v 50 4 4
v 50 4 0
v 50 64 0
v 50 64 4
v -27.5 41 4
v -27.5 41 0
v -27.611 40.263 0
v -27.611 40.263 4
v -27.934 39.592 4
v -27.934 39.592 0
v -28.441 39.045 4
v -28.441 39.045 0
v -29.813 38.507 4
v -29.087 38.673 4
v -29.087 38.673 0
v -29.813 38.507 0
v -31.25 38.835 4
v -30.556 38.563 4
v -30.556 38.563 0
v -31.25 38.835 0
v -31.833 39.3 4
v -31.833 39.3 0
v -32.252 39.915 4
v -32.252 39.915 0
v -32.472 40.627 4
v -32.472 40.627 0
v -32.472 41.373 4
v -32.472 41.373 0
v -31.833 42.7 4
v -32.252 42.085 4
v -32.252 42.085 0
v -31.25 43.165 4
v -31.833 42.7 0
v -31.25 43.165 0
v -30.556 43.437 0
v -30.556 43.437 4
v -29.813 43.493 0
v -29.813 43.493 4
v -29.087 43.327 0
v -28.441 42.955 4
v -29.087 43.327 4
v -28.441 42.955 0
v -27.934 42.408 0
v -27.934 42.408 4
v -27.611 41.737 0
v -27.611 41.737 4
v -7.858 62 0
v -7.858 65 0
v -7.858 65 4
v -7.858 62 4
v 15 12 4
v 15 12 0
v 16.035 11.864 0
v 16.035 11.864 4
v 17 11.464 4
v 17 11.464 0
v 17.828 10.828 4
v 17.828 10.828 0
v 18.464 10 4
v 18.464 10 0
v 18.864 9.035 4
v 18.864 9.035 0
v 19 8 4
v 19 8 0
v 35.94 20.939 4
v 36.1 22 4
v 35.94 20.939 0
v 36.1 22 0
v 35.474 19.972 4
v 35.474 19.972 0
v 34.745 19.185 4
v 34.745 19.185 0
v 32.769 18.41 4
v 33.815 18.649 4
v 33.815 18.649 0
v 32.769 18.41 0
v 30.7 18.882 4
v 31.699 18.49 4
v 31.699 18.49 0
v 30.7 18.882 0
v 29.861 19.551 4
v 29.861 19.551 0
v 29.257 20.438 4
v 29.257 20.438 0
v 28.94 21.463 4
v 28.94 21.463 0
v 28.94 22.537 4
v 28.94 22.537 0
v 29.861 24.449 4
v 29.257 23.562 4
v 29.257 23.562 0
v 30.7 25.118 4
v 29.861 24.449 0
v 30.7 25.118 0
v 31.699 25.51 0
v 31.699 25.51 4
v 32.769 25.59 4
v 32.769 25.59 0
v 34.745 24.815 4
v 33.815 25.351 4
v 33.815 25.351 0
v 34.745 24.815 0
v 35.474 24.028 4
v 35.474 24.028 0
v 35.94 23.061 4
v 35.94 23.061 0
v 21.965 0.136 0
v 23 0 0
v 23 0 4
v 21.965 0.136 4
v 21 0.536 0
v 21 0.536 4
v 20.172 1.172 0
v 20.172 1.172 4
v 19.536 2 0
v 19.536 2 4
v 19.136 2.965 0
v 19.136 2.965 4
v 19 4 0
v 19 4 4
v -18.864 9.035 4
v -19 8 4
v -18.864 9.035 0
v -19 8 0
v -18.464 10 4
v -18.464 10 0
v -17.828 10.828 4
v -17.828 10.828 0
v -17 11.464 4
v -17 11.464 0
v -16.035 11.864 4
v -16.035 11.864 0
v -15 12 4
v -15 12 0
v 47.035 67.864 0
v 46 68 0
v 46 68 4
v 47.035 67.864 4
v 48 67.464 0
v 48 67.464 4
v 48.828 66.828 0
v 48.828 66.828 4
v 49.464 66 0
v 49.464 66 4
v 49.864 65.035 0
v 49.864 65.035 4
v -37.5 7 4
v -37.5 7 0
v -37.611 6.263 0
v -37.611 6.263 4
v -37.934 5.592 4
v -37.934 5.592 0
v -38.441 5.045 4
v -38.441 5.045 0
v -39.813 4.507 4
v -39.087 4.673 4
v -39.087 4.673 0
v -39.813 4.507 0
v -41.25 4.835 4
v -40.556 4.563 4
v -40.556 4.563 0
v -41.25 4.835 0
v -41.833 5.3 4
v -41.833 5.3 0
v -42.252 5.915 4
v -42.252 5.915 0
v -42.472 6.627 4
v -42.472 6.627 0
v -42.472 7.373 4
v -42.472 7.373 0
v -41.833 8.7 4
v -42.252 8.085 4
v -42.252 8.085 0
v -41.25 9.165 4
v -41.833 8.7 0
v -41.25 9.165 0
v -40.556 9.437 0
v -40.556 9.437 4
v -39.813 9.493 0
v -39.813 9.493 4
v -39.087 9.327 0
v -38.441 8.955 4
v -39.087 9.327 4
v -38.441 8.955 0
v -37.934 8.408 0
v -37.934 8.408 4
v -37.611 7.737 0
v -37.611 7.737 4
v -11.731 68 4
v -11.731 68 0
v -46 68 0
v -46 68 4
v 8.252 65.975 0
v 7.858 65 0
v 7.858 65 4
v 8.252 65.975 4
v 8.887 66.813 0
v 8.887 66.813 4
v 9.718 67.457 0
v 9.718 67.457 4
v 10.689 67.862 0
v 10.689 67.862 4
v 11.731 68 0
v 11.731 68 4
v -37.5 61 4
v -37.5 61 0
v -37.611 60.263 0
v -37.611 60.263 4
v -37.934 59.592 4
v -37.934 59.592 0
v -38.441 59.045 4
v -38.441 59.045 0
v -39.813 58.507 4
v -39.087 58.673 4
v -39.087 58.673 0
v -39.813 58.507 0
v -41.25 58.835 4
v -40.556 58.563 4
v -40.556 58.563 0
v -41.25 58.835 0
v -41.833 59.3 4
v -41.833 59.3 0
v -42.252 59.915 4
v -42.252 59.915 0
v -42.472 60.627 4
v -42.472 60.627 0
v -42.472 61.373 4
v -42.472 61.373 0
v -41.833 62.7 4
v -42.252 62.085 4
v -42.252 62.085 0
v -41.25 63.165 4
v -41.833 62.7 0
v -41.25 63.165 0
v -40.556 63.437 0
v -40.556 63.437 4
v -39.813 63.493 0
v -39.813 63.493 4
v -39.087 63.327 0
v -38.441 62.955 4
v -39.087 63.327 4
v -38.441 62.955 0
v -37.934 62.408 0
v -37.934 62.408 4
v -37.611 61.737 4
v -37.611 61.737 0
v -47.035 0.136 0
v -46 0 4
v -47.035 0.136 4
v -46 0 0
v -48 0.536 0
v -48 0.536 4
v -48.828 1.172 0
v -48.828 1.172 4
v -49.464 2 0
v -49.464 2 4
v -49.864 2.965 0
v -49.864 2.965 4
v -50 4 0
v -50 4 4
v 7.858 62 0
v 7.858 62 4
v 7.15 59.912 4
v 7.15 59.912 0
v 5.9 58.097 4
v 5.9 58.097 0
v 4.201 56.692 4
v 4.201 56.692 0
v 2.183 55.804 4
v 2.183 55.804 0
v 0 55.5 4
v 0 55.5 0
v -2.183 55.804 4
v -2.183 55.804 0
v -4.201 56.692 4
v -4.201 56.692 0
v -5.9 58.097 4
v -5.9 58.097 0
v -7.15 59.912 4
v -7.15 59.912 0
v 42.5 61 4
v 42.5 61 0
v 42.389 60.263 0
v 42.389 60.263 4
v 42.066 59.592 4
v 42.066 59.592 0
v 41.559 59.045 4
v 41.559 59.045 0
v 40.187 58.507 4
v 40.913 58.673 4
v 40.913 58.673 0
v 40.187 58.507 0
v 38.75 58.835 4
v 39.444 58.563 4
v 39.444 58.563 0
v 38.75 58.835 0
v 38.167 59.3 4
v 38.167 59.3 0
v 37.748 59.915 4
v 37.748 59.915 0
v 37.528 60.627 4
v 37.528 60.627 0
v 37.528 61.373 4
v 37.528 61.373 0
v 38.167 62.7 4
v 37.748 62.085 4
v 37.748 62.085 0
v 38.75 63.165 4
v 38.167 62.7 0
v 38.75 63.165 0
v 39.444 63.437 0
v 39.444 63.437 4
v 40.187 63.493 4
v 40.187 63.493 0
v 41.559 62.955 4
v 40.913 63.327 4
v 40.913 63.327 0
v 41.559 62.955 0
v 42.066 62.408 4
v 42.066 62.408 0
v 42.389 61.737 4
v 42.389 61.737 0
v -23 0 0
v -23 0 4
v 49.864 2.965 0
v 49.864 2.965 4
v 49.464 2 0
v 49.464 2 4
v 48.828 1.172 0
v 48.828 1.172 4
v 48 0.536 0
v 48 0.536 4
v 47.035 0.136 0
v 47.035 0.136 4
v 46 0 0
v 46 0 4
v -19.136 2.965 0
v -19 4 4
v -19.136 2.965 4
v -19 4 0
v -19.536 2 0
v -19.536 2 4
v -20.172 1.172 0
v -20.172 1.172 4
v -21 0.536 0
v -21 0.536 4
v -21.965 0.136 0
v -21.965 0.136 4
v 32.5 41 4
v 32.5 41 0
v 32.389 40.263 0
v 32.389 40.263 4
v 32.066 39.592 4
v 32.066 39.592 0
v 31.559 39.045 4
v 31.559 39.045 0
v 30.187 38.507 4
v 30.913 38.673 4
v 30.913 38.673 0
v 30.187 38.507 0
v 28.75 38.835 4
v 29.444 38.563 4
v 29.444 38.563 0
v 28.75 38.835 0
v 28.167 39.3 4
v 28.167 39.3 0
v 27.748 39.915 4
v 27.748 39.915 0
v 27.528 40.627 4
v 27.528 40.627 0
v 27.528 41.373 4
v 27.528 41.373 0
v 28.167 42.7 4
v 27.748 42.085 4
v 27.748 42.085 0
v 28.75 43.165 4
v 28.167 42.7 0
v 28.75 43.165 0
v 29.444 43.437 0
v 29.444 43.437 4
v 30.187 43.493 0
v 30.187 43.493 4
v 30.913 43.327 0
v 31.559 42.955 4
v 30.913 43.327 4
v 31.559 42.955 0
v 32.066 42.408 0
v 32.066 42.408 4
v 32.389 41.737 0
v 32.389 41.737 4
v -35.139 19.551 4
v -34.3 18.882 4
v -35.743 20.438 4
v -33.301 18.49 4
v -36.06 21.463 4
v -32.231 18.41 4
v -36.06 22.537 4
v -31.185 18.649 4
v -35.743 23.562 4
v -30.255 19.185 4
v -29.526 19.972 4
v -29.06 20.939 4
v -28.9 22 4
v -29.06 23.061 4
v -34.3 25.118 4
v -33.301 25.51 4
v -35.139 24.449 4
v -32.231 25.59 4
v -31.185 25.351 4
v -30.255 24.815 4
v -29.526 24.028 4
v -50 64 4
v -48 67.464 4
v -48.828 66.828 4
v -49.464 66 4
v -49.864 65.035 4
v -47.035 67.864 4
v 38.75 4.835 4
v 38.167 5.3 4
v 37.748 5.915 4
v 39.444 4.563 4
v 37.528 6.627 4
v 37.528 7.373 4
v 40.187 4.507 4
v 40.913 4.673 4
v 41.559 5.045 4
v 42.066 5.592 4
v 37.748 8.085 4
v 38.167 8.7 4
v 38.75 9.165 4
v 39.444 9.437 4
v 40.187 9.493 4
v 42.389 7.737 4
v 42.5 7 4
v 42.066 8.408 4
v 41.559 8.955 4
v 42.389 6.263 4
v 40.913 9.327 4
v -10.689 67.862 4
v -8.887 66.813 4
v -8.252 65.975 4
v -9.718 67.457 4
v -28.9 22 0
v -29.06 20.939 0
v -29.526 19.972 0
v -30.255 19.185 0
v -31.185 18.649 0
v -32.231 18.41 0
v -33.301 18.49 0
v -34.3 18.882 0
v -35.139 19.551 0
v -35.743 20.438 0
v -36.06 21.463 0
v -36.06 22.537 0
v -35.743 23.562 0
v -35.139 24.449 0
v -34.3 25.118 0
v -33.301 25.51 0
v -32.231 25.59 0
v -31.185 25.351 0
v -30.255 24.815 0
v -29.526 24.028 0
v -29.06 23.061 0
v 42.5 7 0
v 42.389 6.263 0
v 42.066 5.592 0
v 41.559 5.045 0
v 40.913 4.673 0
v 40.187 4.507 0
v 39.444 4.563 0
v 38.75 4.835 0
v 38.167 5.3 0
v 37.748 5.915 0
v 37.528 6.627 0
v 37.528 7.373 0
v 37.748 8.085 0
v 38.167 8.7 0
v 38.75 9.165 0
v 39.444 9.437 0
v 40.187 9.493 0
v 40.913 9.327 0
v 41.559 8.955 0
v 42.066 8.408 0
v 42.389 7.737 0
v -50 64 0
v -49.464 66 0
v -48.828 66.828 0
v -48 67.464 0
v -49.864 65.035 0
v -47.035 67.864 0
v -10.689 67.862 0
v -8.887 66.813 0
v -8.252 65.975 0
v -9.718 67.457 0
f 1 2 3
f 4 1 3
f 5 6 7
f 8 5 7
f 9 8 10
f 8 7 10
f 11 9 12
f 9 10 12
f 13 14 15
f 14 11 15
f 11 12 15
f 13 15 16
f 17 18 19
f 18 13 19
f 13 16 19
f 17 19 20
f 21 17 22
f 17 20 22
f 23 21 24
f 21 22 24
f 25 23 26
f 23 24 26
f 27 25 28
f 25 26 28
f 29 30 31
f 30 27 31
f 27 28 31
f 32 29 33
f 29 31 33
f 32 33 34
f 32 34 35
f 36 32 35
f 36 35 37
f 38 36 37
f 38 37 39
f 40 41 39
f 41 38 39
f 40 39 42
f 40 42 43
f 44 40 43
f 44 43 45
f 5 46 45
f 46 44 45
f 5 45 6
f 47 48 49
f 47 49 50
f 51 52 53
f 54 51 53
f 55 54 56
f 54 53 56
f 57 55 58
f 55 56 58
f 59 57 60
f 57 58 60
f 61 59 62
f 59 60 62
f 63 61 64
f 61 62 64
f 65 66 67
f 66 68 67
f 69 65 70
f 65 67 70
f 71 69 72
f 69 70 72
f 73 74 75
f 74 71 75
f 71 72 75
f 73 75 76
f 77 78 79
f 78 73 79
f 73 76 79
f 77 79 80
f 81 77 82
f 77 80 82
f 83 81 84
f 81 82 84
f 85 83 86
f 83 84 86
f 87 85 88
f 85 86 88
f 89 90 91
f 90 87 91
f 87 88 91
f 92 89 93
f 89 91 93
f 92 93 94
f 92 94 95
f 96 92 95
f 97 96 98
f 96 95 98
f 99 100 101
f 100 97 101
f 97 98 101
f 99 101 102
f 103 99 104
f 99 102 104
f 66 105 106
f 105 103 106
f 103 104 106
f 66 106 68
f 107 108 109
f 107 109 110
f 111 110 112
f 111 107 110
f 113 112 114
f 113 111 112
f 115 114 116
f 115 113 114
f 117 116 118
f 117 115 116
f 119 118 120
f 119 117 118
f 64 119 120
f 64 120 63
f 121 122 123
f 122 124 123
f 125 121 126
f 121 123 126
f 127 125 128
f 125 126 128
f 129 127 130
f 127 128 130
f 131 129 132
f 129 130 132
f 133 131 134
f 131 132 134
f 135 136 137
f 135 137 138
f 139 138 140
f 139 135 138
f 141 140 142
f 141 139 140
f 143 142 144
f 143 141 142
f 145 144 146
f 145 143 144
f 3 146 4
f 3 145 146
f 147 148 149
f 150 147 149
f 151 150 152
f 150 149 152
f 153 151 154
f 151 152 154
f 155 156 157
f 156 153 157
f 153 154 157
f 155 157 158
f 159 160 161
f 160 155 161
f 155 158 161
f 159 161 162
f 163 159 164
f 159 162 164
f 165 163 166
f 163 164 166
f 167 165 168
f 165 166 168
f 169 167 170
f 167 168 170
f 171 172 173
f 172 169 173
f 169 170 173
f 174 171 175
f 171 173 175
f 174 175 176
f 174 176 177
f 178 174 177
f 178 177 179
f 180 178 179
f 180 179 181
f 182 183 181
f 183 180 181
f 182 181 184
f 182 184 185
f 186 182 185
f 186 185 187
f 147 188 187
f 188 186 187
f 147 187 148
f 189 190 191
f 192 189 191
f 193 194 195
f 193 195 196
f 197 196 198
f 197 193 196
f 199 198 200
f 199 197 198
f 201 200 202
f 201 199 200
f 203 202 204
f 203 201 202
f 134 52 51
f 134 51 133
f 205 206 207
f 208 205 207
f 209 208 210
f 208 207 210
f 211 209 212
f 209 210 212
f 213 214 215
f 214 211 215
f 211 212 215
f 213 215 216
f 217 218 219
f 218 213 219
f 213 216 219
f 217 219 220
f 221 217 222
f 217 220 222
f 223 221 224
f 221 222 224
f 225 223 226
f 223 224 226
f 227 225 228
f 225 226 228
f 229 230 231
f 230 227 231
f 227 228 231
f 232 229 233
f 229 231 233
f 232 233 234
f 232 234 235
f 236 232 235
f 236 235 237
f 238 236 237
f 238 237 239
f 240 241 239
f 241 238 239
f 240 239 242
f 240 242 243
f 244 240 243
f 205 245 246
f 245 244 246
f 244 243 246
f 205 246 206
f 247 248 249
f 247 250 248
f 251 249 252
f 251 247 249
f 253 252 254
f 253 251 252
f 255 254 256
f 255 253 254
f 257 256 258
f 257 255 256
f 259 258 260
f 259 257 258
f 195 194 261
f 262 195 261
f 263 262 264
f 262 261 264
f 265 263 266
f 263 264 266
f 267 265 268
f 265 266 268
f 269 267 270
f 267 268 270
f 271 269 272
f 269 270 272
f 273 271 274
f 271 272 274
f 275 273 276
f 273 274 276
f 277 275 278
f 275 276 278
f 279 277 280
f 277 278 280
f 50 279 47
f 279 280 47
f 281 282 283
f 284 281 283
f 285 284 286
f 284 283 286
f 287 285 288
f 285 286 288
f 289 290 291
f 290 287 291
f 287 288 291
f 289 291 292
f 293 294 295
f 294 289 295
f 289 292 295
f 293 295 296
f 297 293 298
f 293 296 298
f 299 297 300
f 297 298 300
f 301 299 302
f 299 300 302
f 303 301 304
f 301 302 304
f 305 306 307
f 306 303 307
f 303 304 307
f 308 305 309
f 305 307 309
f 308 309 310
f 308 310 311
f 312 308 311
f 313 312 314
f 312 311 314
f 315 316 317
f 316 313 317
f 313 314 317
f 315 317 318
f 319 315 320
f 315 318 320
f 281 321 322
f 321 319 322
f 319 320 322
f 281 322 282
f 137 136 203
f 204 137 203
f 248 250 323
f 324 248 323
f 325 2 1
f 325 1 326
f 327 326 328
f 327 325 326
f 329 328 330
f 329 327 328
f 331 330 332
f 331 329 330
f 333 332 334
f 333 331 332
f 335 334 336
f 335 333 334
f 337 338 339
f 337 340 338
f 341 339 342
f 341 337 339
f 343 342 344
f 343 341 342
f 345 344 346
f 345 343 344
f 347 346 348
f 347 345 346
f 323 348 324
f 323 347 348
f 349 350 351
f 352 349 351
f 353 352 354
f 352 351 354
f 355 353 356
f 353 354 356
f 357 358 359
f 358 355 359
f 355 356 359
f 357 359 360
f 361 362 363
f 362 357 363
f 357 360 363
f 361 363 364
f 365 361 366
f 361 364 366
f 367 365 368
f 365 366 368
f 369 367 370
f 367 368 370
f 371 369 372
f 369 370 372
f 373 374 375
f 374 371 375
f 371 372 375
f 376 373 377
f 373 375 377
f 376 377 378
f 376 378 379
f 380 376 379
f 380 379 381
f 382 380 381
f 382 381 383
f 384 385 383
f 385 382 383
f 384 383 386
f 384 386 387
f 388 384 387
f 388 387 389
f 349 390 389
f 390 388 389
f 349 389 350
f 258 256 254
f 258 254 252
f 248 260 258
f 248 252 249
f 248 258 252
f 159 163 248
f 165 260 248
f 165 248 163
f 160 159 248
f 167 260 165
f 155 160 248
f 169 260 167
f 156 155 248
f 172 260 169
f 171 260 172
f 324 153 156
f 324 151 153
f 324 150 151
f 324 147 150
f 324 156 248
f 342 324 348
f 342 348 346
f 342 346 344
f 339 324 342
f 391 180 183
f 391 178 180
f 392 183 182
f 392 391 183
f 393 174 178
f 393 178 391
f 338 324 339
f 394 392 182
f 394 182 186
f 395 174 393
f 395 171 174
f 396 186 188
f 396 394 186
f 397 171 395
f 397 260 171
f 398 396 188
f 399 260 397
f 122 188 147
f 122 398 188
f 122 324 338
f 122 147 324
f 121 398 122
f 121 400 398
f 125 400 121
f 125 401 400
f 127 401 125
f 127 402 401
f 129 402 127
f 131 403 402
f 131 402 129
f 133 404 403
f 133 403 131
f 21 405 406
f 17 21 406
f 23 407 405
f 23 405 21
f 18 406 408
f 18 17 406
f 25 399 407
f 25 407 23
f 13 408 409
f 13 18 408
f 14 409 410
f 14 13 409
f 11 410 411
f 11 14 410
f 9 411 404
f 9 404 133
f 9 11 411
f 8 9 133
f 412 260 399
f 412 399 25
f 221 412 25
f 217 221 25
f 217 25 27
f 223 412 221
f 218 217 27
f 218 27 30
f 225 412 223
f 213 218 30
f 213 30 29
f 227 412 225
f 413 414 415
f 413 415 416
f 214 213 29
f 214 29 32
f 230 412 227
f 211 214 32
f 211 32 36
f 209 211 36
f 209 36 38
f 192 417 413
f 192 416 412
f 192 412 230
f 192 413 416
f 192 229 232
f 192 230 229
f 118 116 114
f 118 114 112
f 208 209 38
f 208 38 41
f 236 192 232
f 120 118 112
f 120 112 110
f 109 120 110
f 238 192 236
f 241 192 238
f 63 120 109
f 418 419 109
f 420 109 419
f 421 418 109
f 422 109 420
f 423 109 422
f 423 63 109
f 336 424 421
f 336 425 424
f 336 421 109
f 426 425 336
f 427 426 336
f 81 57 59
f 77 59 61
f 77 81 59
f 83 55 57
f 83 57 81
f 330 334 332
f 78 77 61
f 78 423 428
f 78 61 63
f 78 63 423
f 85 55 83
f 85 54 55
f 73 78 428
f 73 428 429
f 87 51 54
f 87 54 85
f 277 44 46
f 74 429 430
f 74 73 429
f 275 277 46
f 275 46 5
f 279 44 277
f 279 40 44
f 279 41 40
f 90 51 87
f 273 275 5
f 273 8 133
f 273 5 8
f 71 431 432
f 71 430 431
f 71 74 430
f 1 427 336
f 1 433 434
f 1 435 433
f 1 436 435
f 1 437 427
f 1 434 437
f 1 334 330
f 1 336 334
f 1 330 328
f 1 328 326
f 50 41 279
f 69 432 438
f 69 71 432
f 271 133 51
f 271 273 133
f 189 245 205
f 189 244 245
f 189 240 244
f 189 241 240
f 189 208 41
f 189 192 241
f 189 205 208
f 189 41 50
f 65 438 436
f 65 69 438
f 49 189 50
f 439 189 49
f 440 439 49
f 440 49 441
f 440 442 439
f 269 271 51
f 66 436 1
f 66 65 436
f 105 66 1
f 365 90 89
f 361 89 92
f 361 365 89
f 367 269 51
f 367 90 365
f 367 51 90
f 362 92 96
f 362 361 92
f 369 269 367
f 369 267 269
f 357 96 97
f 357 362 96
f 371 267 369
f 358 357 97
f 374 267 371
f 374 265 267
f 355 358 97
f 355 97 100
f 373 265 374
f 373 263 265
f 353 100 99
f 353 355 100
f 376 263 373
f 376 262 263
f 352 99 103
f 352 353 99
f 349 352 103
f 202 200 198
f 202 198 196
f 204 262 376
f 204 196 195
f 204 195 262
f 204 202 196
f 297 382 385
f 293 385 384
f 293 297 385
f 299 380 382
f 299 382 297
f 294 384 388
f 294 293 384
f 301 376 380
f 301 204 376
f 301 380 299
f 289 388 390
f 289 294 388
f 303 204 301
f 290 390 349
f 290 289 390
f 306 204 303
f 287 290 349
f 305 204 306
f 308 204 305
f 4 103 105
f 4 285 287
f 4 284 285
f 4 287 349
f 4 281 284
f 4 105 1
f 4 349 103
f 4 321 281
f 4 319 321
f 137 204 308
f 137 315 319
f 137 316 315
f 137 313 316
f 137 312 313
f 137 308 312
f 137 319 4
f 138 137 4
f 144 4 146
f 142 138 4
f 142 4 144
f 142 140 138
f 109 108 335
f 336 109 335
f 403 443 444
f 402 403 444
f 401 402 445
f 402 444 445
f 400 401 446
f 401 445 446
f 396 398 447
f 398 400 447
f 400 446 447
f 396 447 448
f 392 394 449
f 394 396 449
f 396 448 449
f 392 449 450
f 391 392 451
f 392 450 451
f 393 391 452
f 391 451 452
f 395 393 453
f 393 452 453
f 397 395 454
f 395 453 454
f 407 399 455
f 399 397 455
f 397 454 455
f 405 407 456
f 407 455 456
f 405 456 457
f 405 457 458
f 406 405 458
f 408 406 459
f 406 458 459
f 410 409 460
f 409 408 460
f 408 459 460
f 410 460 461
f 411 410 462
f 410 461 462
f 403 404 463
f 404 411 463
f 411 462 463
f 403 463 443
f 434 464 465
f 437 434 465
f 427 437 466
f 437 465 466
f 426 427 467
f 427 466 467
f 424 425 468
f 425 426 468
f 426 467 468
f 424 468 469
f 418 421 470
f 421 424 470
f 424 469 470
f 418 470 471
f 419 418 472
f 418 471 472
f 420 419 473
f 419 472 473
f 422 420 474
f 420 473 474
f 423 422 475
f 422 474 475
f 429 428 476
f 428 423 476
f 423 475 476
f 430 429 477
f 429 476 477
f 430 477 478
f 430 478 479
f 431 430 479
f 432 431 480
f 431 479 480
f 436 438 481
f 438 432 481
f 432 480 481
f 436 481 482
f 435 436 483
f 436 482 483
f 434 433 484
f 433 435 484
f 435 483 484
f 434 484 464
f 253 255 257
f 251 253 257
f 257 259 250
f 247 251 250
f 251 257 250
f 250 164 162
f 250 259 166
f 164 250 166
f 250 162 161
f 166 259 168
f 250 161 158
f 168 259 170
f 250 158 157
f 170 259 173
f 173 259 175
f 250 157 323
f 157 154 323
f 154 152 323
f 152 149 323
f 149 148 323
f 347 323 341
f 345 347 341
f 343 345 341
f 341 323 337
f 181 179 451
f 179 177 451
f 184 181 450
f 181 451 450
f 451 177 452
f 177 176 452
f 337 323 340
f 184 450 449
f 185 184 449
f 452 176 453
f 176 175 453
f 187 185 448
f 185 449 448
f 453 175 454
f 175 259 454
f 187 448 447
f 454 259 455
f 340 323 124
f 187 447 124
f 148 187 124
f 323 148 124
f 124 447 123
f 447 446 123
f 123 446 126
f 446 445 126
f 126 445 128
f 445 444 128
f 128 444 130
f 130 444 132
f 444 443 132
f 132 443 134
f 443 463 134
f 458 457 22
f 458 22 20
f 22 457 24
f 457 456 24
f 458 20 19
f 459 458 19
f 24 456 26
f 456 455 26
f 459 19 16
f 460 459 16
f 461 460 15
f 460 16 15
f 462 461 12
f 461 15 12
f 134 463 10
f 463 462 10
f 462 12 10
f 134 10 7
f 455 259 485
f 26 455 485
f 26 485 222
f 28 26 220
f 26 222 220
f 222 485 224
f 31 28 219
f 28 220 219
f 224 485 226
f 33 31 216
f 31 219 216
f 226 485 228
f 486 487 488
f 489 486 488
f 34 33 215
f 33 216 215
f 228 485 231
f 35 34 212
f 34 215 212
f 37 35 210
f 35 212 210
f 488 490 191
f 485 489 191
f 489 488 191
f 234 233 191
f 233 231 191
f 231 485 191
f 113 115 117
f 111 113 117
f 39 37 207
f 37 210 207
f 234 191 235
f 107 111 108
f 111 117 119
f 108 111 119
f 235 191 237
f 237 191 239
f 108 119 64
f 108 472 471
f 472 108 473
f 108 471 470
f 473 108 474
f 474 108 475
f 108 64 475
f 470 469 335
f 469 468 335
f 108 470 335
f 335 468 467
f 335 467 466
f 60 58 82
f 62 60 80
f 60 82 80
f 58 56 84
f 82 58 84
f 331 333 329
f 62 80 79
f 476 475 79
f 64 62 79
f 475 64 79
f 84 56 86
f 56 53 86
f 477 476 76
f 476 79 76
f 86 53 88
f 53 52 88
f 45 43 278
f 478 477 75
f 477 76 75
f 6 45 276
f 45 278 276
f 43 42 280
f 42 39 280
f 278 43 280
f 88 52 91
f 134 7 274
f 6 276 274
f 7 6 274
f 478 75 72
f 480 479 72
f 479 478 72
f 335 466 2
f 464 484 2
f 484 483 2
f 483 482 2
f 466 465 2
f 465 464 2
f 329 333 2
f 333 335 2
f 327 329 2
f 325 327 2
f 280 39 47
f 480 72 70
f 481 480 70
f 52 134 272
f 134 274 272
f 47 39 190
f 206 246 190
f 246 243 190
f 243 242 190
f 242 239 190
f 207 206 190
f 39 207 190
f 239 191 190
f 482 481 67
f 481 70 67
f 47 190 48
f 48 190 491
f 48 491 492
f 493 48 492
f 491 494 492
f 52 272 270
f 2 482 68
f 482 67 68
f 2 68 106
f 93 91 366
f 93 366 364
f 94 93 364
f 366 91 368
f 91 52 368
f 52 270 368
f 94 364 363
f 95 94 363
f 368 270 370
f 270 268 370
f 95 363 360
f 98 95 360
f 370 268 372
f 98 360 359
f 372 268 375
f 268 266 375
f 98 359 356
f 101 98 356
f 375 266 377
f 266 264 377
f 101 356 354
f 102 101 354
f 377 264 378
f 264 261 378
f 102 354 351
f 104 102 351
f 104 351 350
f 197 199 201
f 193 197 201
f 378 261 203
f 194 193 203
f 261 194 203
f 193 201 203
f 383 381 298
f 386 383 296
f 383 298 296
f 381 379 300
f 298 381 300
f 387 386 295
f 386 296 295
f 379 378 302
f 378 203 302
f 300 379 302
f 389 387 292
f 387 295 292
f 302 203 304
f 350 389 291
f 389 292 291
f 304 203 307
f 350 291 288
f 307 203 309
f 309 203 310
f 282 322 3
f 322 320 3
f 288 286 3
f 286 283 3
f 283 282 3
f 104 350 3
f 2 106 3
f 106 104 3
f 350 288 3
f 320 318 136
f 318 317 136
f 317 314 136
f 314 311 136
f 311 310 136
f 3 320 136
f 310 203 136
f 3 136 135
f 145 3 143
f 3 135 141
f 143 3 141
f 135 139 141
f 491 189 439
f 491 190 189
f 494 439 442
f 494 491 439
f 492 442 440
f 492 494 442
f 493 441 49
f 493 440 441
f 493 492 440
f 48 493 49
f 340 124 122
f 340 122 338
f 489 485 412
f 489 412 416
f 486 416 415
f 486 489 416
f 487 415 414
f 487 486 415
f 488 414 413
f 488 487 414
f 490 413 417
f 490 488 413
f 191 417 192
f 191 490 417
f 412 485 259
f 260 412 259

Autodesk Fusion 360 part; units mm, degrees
sketch "Sketch1" plane through (0, 0, 0) normal (0, 0, 1) x (1, 0, 0)
  line L0 (-7.8581, 65) -> (-7.8581, 62)
  circle A0 centre (-40, 7) radius 2.5
  line L1 (-32.5, 22) -> (32.5, 22) construction
  line L2 (-40, 61) -> (-40, 7) construction
  arc A1 (19, 8) -> (15, 12) centre (15, 8) ccw
  line L3 (40, 7) -> (40, 61) construction
  arc A2 (-7.8581, 65) -> (-11.7311, 68) centre (-11.7311, 64) ccw
  arc A3 (-50, 4) -> (-46, 0) centre (-46, 4) ccw
  arc A4 (50, 64) -> (46, 68) centre (46, 64) ccw
  line L4 (19, 4) -> (19, 8)
  line L5 (7.8581, 65) -> (7.8581, 62)
  line L6 (-11.7311, 68) -> (-46, 68)
  circle A5 centre (32.5, 22) radius 3.6
  line L7 (-40, 7) -> (40, 7) construction
  line L8 (-30, 41) -> (30, 41) construction
  circle A6 centre (40, 61) radius 2.5
  circle A7 centre (40, 7) radius 2.5
  arc A8 (19, 4) -> (23, 0) centre (23, 4) ccw
  arc A9 (-46, 68) -> (-50, 64) centre (-46, 64) ccw
  line L9 (0, 0) -> (0, 50.832) construction
  arc A10 (11.7311, 68) -> (7.8581, 65) centre (11.7311, 64) ccw
  arc A11 (-15, 12) -> (-19, 8) centre (-15, 8) ccw
  line L10 (-50, 64) -> (-50, 4)
  arc A12 (-7.8581, 62) -> (7.8581, 62) centre (0, 63.5) ccw
  line L11 (15, 12) -> (-15, 12)
  circle A13 centre (-32.5, 22) radius 3.6
  arc A14 (-23, 0) -> (-19, 4) centre (-23, 4) ccw
  line L12 (23, 0) -> (46, 0)
  line L13 (46, 68) -> (11.7311, 68)
  line L14 (-50, 34) -> (50, 34) construction
  circle A15 centre (-30, 41) radius 2.5
  circle A16 centre (-40, 61) radius 2.5
  line L15 (40, 61) -> (-40, 61) construction
  line L16 (50, 4) -> (50, 64)
  arc A17 (46, 0) -> (50, 4) centre (46, 4) ccw
  line L17 (-19, 8) -> (-19, 4)
  line L18 (-46, 0) -> (-23, 0)
  circle A18 centre (30, 41) radius 2.5
  point P0 (-50, 68)
  point P1 (-50, 0)
  point P2 (-50, 0)
  dimension "d1" = 68
  dimension "d3" = 50
  dimension "d4" = 19
  dimension "d5" = 19
  dimension "d6" = 40
  dimension "d7" = 40
  dimension "d8" = 50
  dimension "d9" = 32.5
  dimension "d10" = 32.5
  dimension "d11" = 30
  dimension "d13" = 54
  dimension "d14" = 27
  dimension "d15" = 7
  dimension "d16" = 12
  dimension "d17" = 4
  dimension "d18" = 4
  dimension "d19" = 4
  dimension "d20" = 4
  dimension "d24" = 8
  dimension "d25" = 4.5
  dimension "d27" = 6
  dimension "d28" = 3
  dimension "d29" = 4
  dimension "d30" = 6
  dimension "d32" = 4
  dimension "d35" = 50
  dimension "d36" = 4
  dimension "d37" = 4
  dimension "d38" = 30
  dimension "d39" = 15
  dimension "d40" = 34
  dimension "d44" = 12
  dimension "d45" = 7.2
  dimension "d46" = 5
  dimension "d47" = 30
  dimension "d47" = 30
extrude "Extrude1" add sketch "Sketch1" along normal blind 4
equation "d4 = ( 38 / 2 ) * 1 mm"
equation "d9 = ( 65 / 2 ) * 1 mm"
equation "d14 = ( 54 / 2 ) * 1 mm"
